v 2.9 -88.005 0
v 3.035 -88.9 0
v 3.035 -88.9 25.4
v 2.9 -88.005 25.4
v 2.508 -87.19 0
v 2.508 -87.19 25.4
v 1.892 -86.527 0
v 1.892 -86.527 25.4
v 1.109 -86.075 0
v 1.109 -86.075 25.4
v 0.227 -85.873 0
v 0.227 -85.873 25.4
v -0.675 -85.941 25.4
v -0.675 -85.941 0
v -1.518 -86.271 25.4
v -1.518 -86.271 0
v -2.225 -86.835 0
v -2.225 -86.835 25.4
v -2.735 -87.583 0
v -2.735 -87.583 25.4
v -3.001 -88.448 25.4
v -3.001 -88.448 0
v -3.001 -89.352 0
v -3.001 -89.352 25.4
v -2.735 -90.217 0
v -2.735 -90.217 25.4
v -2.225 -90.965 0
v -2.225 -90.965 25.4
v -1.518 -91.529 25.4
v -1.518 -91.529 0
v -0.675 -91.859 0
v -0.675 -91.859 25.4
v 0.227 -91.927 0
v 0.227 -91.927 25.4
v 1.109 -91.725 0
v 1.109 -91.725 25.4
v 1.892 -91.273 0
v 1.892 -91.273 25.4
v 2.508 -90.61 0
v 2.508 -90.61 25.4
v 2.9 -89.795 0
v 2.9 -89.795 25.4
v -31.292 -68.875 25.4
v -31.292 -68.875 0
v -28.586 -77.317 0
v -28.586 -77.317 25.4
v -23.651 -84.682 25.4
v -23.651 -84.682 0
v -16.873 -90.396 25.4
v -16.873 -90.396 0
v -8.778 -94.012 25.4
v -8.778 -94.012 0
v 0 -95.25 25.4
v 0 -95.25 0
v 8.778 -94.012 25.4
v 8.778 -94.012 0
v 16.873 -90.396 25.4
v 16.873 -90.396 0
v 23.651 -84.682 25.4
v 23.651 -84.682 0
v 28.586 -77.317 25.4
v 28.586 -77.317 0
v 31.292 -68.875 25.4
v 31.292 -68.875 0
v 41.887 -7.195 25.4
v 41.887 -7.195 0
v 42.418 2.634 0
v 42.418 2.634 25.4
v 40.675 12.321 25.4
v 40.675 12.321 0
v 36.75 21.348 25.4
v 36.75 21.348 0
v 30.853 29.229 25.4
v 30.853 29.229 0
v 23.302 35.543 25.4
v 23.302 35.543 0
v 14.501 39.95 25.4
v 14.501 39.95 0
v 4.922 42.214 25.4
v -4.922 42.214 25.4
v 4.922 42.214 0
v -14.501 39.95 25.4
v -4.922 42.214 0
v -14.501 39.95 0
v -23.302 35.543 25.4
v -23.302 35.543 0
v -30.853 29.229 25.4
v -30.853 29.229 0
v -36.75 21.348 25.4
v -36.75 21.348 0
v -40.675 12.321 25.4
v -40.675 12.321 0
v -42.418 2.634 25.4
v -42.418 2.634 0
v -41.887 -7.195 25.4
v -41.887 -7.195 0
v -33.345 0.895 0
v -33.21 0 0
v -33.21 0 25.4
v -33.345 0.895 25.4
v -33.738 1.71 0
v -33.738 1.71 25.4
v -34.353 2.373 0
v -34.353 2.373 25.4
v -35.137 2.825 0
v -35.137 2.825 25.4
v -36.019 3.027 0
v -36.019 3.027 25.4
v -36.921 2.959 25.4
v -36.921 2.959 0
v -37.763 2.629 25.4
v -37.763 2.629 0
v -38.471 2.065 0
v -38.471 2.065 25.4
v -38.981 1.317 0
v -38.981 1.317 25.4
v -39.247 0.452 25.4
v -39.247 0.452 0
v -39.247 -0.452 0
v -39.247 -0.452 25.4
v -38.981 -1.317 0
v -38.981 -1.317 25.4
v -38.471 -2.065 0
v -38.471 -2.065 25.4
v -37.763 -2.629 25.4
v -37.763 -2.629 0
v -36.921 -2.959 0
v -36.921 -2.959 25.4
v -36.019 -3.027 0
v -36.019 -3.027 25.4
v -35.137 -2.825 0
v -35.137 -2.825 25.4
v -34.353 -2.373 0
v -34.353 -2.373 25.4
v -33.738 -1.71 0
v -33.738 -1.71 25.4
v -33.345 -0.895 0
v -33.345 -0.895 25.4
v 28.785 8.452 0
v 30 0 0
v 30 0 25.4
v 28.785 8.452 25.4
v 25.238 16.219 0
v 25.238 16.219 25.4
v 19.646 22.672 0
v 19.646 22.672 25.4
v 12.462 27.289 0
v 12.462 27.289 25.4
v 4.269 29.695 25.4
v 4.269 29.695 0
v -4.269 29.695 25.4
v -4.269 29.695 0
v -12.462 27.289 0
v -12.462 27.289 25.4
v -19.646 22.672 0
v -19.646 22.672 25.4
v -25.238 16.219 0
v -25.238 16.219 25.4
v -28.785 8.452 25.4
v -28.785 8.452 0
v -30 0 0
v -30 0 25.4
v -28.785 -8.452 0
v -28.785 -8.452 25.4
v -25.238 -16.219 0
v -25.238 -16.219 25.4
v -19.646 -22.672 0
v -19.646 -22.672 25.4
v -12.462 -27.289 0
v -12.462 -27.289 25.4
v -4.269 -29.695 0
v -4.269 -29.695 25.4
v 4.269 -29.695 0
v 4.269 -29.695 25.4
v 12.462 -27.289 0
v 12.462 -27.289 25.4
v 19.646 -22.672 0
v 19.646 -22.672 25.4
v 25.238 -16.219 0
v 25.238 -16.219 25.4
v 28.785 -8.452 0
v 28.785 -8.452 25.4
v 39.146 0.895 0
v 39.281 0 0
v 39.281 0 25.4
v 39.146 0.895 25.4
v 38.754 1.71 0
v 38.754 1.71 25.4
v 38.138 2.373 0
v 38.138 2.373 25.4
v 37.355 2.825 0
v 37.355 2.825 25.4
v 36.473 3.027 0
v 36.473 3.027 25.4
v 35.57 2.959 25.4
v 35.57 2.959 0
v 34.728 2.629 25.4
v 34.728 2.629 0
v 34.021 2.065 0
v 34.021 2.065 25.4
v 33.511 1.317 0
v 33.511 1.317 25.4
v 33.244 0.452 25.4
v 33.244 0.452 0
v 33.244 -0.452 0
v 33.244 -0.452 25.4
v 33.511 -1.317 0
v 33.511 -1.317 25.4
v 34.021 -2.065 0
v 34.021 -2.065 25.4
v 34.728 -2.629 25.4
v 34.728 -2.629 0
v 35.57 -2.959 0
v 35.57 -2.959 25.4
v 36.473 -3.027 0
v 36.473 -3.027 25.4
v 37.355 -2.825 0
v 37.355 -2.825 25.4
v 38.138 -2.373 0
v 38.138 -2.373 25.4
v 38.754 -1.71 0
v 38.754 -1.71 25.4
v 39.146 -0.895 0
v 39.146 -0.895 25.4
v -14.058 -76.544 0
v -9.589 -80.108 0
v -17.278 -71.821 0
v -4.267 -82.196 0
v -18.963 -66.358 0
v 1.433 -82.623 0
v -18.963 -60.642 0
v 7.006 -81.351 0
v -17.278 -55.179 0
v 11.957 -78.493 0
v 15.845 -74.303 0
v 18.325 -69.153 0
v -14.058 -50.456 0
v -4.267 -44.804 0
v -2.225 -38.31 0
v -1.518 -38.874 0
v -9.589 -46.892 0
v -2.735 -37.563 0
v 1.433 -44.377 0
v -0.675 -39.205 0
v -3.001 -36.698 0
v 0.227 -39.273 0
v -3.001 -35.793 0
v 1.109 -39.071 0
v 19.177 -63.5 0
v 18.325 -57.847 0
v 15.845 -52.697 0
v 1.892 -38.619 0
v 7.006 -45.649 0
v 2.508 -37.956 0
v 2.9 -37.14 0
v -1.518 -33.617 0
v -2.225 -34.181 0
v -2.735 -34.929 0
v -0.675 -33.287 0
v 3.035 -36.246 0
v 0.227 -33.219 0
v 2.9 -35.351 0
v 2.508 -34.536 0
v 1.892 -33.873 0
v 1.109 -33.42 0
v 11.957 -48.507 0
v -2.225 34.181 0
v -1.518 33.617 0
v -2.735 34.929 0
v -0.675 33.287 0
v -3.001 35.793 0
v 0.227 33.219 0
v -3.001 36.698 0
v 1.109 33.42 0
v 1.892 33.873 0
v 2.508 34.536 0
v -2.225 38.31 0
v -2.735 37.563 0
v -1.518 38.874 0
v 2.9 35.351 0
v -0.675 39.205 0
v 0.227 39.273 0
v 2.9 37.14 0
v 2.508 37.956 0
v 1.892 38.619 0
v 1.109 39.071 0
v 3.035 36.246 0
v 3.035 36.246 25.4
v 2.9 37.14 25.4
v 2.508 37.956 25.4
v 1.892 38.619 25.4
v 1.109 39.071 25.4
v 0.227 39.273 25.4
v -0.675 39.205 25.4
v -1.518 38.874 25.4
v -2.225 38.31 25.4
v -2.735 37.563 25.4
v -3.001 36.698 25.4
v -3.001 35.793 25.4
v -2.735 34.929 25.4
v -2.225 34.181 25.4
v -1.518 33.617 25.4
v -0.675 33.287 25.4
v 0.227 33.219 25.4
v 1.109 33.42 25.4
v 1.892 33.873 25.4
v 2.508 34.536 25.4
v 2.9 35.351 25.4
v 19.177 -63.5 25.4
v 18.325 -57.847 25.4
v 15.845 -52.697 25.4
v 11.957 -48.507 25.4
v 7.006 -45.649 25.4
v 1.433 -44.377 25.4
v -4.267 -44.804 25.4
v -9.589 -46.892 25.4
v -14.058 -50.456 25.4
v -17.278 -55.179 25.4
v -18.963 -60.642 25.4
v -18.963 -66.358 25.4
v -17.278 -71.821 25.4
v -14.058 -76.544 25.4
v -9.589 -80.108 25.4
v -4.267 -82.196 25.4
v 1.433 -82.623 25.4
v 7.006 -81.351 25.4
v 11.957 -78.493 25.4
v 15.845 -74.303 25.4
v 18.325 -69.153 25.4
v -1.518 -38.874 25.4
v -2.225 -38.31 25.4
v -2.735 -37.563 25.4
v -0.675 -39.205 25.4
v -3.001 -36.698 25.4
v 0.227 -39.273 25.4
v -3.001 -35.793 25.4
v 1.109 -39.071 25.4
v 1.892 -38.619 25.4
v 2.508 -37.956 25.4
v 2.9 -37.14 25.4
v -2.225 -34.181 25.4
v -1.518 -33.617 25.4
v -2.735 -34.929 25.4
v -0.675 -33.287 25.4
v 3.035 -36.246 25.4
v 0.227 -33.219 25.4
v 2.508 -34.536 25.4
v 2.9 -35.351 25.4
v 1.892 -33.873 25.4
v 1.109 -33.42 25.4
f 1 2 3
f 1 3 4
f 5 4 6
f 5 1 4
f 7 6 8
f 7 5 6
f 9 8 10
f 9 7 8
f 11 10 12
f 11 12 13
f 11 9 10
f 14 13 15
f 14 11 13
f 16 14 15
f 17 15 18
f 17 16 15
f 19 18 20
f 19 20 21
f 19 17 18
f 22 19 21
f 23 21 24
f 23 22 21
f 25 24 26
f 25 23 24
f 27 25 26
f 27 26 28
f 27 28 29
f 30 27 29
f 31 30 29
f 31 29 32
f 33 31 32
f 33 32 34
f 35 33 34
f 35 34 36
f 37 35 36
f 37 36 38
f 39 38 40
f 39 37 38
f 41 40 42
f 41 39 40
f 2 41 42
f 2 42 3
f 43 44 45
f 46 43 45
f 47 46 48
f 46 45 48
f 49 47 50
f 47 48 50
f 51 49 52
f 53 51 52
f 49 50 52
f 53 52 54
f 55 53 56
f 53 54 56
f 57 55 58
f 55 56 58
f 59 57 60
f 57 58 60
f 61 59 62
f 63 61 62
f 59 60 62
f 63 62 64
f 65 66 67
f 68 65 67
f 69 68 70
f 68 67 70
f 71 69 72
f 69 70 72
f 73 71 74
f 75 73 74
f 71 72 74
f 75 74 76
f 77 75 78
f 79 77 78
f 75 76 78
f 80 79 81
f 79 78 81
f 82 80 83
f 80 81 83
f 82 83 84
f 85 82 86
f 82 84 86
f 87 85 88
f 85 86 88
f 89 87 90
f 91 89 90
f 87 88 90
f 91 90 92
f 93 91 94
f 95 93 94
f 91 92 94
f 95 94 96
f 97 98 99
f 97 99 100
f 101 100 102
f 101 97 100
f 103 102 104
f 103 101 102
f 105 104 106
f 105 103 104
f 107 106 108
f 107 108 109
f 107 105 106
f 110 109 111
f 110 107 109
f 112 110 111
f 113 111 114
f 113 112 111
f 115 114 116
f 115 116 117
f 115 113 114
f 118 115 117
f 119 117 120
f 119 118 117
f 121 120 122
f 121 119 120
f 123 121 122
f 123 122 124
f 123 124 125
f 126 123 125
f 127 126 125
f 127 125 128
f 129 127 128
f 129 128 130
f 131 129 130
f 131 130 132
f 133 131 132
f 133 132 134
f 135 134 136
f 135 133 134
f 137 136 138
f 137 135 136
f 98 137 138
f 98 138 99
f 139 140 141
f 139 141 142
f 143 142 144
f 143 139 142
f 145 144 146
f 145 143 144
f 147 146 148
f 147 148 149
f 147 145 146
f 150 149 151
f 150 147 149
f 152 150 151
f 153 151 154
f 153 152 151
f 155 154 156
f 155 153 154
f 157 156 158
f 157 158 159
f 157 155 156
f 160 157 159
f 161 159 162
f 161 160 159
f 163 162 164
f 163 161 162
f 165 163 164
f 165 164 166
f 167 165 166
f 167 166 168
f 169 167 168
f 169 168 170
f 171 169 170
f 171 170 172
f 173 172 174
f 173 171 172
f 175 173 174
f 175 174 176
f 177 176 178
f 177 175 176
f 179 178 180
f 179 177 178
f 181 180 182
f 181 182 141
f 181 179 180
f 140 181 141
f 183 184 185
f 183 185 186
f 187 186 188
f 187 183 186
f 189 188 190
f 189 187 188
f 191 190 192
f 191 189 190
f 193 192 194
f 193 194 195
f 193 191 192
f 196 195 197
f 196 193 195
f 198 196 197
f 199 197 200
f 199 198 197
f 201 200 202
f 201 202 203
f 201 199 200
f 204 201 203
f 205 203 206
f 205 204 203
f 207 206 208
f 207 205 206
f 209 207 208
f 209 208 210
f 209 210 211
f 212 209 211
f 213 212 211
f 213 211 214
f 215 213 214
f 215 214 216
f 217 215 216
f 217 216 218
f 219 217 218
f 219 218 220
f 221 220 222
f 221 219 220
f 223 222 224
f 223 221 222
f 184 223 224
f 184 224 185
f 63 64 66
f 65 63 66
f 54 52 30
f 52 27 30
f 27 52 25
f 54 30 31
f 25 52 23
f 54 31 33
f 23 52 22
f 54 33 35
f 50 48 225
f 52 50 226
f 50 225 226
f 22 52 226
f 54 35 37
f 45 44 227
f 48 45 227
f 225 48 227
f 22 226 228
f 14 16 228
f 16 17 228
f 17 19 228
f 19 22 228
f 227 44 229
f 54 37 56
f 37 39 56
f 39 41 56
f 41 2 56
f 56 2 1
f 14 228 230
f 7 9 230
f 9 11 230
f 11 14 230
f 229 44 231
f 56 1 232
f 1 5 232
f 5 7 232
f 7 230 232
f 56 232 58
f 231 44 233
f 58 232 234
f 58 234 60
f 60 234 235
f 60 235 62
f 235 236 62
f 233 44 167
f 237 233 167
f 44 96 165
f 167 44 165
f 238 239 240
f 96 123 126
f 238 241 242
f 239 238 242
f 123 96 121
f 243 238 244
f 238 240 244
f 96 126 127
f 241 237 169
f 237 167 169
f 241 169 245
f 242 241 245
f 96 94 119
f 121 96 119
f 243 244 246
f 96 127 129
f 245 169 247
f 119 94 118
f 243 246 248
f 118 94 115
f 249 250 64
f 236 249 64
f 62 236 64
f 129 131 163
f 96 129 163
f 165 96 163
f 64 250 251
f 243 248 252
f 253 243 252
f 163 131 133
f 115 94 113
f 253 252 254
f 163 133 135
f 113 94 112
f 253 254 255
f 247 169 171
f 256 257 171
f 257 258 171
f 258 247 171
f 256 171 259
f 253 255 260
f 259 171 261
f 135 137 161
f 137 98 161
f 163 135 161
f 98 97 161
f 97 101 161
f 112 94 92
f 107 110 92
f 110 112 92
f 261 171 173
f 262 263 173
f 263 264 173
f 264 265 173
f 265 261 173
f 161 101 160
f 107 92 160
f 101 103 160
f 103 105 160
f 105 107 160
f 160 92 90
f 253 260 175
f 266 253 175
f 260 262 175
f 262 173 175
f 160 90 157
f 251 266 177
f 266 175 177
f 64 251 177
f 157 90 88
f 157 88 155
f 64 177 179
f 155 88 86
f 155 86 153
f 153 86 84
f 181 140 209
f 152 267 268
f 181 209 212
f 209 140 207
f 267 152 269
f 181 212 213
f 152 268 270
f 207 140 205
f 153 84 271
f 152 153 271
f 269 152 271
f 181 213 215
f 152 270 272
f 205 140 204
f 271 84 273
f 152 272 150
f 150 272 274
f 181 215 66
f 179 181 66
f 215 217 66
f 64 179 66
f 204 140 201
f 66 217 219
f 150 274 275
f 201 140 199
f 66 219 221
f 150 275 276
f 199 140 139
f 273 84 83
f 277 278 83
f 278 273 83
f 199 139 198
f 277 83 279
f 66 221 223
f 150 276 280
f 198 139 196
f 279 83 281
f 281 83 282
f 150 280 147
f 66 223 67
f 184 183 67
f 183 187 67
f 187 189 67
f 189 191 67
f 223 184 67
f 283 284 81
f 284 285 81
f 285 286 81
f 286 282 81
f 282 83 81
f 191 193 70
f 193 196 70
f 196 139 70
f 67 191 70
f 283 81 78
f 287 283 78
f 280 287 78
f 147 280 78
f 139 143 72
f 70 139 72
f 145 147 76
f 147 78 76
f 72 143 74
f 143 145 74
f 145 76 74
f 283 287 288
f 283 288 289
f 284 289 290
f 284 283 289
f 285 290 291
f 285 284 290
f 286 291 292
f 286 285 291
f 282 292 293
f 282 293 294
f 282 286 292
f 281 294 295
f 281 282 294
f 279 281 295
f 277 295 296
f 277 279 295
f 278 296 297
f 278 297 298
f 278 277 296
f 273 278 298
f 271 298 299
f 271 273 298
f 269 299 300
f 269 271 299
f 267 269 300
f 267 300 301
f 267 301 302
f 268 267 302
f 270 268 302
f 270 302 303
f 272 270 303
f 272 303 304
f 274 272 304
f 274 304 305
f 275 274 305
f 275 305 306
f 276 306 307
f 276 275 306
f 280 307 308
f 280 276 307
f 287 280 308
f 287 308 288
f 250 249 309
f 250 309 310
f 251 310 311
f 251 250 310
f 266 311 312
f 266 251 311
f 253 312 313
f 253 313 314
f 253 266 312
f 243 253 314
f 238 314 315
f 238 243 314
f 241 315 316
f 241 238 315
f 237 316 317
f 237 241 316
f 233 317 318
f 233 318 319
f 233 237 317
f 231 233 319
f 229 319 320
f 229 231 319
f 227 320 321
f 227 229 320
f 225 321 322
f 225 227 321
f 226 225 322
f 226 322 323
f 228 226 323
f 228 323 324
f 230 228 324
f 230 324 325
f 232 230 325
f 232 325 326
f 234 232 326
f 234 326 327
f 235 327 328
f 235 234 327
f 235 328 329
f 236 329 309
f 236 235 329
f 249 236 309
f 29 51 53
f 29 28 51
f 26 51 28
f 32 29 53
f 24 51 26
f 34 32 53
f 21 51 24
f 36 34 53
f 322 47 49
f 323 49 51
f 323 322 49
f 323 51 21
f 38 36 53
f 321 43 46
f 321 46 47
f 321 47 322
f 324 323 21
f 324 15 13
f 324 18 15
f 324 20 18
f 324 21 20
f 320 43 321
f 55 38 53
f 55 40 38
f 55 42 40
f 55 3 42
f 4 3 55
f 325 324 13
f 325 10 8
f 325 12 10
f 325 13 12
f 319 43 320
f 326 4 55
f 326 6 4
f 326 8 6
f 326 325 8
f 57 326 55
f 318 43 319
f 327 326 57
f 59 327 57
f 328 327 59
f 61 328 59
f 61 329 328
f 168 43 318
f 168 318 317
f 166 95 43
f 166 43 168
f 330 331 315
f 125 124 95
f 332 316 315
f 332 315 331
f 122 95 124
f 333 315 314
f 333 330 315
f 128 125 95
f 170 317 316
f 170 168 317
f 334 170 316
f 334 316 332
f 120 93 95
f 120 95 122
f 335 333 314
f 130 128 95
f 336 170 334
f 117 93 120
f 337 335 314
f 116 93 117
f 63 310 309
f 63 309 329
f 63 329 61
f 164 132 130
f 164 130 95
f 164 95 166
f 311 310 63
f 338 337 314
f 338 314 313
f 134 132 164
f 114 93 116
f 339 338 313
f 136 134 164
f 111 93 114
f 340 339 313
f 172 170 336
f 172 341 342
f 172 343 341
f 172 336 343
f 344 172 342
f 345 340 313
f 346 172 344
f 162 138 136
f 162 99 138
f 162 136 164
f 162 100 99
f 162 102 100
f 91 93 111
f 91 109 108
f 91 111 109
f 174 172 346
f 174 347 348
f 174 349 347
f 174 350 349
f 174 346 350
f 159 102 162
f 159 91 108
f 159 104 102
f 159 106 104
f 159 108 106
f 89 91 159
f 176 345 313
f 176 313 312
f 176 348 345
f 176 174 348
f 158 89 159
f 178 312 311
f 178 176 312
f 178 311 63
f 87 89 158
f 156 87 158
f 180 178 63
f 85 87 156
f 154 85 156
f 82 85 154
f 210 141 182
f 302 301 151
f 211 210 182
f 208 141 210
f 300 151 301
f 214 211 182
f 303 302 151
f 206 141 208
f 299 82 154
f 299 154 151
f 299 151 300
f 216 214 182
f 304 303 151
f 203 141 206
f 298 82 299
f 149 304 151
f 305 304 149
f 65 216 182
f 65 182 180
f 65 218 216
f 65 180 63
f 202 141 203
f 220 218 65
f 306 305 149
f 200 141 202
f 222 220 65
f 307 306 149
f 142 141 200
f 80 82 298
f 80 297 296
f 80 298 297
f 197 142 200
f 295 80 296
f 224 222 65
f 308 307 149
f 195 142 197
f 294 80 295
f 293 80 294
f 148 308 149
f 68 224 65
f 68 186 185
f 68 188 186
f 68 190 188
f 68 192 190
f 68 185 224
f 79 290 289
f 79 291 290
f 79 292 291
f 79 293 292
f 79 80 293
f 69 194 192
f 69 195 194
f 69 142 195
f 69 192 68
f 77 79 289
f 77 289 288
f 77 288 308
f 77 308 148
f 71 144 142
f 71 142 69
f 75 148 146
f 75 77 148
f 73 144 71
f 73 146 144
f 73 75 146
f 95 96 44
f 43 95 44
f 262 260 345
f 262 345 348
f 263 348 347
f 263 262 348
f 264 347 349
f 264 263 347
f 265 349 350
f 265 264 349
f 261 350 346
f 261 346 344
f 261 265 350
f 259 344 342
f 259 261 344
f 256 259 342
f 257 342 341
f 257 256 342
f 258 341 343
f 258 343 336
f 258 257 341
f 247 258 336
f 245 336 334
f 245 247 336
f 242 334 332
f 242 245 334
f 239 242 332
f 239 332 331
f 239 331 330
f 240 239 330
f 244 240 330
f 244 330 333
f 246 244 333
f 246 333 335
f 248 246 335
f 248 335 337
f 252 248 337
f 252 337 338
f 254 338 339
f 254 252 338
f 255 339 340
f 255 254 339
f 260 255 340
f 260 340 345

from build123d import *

# Parameters (mm, degrees)
F0_R     = 3.0353
F0_R_2   = 19.177
F0_R_3   = 30
F1_DEPTH = 25.4


with BuildPart() as f1:
    # F0 (on Top) → F1 (new body)
    with BuildSketch(Plane.XY):
        with BuildLine():
            ThreePointArc((-31.291722, -68.875), (0, -95.25), (31.291722, -68.875))
            Line((31.291722, -68.875), (41.886557, -7.194882))
            ThreePointArc((41.886557, -7.194882), (0, 42.5), (-41.886557, -7.194882))
            Line((-41.886557, -7.194882), (-31.291722, -68.875))
        make_face()
        with Locations((0, -88.9)):
            Circle(F0_R, mode=Mode.SUBTRACT)
        with Locations((0, -63.5)):
            Circle(F0_R_2, mode=Mode.SUBTRACT)
        with Locations((0, -36.2458)):
            Circle(F0_R, mode=Mode.SUBTRACT)
        with Locations((-36.2458, 0)):
            Circle(F0_R, mode=Mode.SUBTRACT)
        Circle(F0_R_3, mode=Mode.SUBTRACT)
        with Locations((36.2458, 0)):
            Circle(F0_R, mode=Mode.SUBTRACT)
        with Locations((0, 36.2458)):
            Circle(F0_R, mode=Mode.SUBTRACT)
    extrude(amount=F1_DEPTH)


solid = f1.part
